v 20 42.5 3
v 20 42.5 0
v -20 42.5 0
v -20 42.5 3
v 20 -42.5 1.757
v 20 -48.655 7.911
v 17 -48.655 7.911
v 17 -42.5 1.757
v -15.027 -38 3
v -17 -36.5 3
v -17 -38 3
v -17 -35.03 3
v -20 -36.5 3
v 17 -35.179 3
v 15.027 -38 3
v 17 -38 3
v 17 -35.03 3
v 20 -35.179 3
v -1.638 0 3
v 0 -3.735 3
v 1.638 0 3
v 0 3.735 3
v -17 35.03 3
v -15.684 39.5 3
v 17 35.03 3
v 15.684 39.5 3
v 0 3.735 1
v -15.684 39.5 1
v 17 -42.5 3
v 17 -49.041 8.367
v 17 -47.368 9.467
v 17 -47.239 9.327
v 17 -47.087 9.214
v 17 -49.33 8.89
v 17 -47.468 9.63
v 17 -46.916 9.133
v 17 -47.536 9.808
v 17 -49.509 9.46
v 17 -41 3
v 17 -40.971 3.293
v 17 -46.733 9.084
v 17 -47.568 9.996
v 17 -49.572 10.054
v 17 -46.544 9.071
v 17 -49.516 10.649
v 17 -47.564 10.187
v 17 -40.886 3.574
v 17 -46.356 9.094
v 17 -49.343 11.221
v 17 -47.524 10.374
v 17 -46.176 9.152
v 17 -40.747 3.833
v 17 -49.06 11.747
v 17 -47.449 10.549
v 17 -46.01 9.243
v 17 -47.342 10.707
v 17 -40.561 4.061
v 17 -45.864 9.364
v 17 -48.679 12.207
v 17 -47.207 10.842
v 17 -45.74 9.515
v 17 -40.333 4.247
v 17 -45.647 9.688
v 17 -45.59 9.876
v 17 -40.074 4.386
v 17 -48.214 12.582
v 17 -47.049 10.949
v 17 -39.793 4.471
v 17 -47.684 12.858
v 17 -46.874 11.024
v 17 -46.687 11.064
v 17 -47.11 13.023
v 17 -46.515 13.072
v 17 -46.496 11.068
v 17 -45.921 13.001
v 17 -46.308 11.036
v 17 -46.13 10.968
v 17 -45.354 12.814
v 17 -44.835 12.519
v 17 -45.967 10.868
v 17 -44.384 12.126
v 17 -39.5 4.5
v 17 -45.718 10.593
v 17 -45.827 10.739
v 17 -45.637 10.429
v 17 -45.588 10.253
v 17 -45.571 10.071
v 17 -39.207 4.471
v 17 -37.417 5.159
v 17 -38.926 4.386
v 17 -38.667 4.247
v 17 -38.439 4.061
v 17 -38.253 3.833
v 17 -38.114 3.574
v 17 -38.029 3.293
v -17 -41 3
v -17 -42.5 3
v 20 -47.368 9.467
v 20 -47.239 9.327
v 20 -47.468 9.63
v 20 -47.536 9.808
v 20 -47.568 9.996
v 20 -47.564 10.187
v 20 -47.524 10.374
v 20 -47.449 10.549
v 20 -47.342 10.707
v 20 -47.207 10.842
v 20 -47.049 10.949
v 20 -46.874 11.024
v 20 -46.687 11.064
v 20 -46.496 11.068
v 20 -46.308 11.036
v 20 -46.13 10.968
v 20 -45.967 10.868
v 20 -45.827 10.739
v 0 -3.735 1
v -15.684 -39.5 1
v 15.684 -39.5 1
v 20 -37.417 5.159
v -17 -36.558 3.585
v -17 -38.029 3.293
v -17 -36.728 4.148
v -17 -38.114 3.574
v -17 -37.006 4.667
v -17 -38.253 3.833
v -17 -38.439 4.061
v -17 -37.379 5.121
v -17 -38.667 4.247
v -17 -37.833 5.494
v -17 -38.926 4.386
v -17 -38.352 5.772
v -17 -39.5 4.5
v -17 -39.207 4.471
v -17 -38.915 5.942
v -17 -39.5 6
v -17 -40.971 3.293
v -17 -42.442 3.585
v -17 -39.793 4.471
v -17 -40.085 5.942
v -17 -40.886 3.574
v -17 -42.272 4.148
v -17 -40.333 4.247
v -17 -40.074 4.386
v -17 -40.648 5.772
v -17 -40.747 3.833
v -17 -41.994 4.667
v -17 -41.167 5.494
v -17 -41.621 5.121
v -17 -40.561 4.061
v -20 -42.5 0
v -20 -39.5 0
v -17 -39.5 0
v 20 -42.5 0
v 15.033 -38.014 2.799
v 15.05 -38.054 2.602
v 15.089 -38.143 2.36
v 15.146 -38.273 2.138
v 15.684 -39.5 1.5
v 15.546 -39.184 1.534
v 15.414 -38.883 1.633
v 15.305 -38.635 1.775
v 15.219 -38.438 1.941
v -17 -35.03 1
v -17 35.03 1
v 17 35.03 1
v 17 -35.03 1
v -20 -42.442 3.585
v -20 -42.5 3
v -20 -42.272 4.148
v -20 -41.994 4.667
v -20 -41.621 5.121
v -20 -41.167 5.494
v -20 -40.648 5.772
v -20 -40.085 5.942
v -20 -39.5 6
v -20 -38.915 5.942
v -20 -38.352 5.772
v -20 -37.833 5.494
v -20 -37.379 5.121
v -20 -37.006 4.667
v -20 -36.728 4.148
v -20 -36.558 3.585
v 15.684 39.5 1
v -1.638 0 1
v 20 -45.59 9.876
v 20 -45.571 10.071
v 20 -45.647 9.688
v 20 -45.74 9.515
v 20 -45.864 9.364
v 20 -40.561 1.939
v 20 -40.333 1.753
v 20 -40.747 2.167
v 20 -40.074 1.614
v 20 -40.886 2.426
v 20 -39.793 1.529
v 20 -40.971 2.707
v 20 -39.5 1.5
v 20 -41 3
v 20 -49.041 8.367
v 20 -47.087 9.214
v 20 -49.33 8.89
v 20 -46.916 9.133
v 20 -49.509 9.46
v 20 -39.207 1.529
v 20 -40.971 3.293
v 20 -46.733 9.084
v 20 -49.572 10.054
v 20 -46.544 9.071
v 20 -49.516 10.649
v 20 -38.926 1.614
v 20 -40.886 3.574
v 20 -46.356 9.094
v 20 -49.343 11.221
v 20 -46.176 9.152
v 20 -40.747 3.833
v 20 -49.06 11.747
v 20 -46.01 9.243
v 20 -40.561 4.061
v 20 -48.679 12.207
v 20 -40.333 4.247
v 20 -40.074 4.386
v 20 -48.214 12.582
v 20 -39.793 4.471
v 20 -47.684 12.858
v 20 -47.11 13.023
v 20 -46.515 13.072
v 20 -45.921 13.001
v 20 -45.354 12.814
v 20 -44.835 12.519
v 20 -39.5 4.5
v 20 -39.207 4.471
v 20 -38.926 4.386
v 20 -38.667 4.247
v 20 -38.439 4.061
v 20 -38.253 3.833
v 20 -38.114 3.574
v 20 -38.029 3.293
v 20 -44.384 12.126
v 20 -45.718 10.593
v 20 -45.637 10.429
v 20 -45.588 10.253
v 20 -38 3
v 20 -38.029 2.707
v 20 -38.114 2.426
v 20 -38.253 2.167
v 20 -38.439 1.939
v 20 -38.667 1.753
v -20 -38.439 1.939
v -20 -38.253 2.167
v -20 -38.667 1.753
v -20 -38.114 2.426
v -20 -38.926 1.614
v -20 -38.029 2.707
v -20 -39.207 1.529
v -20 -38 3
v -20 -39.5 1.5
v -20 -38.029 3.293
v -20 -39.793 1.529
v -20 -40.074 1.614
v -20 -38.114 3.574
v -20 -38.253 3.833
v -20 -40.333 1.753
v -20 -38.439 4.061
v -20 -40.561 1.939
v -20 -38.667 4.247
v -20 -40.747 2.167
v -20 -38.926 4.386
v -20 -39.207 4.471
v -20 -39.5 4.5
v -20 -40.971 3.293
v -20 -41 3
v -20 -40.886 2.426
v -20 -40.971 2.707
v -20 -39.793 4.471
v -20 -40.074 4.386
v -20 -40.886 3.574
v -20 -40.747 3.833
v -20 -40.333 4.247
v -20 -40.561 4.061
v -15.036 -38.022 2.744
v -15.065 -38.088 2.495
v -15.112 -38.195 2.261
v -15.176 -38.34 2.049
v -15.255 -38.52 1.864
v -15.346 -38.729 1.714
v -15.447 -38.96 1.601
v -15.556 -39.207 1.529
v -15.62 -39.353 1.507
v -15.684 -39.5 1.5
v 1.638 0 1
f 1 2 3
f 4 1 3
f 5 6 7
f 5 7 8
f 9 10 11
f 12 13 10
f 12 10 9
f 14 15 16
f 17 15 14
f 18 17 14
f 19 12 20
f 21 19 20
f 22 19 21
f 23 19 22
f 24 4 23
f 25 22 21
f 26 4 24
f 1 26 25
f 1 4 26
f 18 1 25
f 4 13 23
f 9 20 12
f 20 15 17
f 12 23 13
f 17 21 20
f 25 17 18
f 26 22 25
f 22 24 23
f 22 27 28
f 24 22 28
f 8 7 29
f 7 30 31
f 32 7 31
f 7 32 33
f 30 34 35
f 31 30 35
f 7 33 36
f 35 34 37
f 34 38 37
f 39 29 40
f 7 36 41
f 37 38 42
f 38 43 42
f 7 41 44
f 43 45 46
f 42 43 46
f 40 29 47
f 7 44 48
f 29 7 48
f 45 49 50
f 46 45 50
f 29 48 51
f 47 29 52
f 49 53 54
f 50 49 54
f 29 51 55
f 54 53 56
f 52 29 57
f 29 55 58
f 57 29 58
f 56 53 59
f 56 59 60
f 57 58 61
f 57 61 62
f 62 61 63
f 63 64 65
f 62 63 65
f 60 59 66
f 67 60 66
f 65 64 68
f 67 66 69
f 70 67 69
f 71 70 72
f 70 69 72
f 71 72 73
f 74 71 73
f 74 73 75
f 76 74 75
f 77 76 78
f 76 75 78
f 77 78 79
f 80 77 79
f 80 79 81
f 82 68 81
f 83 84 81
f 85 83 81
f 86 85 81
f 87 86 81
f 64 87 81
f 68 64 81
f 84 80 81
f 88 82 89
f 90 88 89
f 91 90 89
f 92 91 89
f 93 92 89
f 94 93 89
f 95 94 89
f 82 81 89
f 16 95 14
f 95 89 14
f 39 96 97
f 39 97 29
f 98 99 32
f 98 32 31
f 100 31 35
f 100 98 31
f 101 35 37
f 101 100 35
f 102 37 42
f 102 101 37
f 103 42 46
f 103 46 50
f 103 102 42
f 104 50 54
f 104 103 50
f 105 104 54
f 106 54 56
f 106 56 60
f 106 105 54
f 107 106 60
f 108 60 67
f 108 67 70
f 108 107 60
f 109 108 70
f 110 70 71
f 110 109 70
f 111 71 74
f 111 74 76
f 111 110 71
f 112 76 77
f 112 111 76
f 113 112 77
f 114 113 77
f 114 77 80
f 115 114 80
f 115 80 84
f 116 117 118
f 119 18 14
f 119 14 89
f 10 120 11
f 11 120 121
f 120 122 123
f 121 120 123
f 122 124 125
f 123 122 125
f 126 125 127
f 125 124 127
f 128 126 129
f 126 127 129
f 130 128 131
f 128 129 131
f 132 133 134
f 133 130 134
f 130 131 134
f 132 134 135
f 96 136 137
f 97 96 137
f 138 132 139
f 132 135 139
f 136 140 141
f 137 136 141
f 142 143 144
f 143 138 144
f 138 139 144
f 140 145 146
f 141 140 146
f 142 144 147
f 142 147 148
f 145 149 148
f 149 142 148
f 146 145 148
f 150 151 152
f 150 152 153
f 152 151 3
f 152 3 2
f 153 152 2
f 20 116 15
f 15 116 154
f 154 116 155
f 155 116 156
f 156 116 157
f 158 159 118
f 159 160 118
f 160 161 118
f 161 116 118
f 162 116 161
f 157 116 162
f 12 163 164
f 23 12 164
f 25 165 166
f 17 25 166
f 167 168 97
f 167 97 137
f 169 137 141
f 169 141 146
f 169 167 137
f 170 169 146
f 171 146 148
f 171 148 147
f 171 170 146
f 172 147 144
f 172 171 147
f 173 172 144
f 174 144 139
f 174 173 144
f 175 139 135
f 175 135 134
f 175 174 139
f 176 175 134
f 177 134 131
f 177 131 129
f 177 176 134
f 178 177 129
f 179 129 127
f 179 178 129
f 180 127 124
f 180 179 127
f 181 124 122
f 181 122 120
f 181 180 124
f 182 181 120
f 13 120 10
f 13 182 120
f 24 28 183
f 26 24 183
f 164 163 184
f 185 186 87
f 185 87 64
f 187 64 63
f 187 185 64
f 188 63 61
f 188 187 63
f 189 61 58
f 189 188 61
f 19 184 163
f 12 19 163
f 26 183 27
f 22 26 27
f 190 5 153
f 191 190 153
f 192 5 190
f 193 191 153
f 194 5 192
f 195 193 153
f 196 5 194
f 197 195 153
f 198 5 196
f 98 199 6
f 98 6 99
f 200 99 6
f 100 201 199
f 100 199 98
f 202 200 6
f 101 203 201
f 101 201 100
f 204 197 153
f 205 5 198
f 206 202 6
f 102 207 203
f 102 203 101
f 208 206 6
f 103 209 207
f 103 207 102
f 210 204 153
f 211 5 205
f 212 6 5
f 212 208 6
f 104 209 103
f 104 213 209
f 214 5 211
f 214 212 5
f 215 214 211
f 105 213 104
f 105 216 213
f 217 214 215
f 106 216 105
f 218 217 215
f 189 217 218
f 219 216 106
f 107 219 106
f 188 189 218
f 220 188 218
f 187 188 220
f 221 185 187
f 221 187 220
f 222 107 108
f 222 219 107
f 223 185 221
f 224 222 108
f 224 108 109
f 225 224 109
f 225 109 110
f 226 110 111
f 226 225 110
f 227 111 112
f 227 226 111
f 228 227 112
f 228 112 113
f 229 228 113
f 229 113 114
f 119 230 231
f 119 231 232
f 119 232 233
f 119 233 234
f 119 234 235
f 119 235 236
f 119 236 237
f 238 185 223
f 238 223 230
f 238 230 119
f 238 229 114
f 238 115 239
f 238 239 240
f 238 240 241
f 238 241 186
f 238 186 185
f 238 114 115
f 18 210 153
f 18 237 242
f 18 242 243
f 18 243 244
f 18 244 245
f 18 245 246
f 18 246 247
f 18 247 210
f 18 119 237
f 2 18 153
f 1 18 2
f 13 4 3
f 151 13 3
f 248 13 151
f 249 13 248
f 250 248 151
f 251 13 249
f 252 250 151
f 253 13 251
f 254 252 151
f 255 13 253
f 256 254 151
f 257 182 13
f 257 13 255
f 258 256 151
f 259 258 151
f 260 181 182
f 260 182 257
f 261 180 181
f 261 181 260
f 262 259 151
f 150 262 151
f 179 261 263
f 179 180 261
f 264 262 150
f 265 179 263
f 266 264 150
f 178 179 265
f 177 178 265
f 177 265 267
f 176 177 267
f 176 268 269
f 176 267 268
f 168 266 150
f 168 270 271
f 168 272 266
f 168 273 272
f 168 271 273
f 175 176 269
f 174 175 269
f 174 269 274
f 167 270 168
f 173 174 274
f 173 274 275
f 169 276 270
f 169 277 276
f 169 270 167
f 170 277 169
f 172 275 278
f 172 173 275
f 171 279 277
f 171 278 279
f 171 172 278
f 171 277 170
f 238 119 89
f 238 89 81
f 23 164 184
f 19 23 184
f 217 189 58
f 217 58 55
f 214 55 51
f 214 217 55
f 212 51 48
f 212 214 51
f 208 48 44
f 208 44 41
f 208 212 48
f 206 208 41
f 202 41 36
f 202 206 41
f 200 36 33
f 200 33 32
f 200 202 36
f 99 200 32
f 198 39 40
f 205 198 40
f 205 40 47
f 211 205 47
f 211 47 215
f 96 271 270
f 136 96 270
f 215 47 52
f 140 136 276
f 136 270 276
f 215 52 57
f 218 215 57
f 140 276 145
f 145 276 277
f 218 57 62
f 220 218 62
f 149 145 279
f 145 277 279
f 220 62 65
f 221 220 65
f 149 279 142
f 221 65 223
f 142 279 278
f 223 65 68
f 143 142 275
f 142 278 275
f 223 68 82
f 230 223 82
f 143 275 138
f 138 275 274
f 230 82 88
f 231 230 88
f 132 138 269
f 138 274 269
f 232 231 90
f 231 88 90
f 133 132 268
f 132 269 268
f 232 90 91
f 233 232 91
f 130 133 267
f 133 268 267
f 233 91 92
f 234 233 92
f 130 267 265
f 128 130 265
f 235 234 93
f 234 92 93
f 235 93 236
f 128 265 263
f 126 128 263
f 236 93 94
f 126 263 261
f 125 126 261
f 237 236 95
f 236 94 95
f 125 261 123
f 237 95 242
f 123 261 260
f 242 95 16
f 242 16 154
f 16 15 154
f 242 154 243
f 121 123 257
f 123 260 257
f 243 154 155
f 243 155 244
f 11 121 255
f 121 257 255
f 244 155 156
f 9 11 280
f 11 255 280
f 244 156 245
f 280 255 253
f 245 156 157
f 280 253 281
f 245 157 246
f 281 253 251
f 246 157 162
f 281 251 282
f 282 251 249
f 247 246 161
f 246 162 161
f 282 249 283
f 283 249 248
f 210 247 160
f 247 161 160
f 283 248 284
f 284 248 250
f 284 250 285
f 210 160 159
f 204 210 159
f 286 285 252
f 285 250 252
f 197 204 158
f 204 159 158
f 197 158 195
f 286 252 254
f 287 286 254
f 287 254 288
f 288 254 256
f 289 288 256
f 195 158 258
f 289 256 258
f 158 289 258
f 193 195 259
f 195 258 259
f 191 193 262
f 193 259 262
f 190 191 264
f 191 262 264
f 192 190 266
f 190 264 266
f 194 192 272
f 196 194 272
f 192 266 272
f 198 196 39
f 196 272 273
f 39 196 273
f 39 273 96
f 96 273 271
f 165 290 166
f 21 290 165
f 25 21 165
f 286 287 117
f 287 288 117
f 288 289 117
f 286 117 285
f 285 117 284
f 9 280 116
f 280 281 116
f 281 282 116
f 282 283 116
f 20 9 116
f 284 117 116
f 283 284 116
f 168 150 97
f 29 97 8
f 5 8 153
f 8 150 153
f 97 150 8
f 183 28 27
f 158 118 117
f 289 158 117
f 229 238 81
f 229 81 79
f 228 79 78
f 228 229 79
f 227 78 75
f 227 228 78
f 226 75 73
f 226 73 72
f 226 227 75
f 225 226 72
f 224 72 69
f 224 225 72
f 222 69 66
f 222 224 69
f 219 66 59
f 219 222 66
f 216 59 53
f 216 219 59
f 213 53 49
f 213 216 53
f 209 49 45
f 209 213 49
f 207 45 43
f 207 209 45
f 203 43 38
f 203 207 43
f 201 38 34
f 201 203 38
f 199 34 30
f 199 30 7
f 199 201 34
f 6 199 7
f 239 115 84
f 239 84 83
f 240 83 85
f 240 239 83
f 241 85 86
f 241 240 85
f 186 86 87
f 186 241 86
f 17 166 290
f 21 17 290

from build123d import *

# Parameters (mm, degrees)
F0_W      = 40
F0_H      = 85
F1_DEPTH  = 1
F2_W      = 3
F2_H      = 3
F3_DEPTH  = 2
F5_DEPTH  = 3
F7_DEPTH  = 3
F9_R      = 1.5
F10_DEPTH = 45


with BuildPart() as f1:
    # F0 (on Top) → F1 (new body)
    with BuildSketch(Plane.XY):
        Rectangle(F0_W, F0_H)
    extrude(amount=F1_DEPTH)

    # F2 (on face) → F3 (join)
    with BuildSketch(Plane.XY.offset(1)):
        Polygon((-17, -42.5), (17, -42.5), (15.6843836329, -39.5), (-15.6843836329, -39.5), align=None)
        Polygon((-17, -39.5), (-17, -42.5), (-15.6843836329, -39.5), align=None)
        with Locations((-18.5, -41)):
            Rectangle(F2_W, F2_H)
        Polygon((15.6843836329, -39.5), (17, -42.5), (17, -39.5), align=None)
        with Locations((18.5, -41)):
            Rectangle(F2_W, F2_H)
        Polygon((17, -35.0301999523), (17, -39.5), (20, -39.5), (20, 39.5), (17, 39.5), (17, 35.0301999523), align=None)
        Polygon((15.6843836329, -39.5), (17, -39.5), (17, -35.0301999523), (1.6378985336, 0), (0, -3.7349000238), align=None)
        Polygon((-15.6843836329, -39.5), (0, -3.7349000238), (-1.6378985336, 0), (-17, -35.0301999523), (-17, -39.5), align=None)
        Polygon((-20, -39.5), (-17, -39.5), (-17, -35.0301999523), (-17, 35.0301999523), (-17, 39.5), (-20, 39.5), align=None)
        Polygon((-1.6378985336, 0), (0, -3.7349000238), (1.6378985336, 0), (0, 3.7349000238), align=None)
        Polygon((-17, 35.0301999523), (-1.6378985336, 0), (0, 3.7349000238), (-15.6843836329, 39.5), (-17, 39.5), align=None)
        Polygon((1.6378985336, 0), (17, 35.0301999523), (17, 39.5), (15.6843836329, 39.5), (0, 3.7349000238), align=None)
        with Locations((-18.5, 41)):
            Rectangle(F2_W, F2_H)
        Polygon((-17, 39.5), (-15.6843836329, 39.5), (-17, 42.5), align=None)
        Polygon((15.6843836329, 39.5), (17, 42.5), (-17, 42.5), (-15.6843836329, 39.5), align=None)
        Polygon((15.6843836329, 39.5), (17, 39.5), (17, 42.5), align=None)
        with Locations((18.5, 41)):
            Rectangle(F2_W, F2_H)
    extrude(amount=F3_DEPTH)

    # F4 (on face) → F5 (join)
    with BuildSketch(Plane.YZ.offset(20)):
        with BuildLine():
            ThreePointArc((-42.5, 3), (-42.2716385975, 4.1480502971), (-41.6213203436, 5.1213203436))
            Line((-41.6213203436, 5.1213203436), (-44.4490675498, 7.9490675498))
            ThreePointArc((-44.4490675498, 7.9490675498), (-46.5442111918, 7.0702264387), (-48.6547486938, 7.9114279791))
            Line((-48.6547486938, 7.9114279791), (-42.5, 1.7572743533))
            Line((-42.5, 1.7572743533), (-42.5, 3))
        make_face()
        with BuildLine():
            Line((-39.5, 3), (-36.5, 3))
            ThreePointArc((-36.5, 3), (-36.7387500509, 4.1728165749), (-37.4169991456, 5.1589598052))
            ThreePointArc((-37.4169991456, 5.1589598052), (-39.5268566208, 5.9998797846), (-41.6213203436, 5.1213203436))
            Line((-41.6213203436, 5.1213203436), (-39.5, 3))
        make_face()
        with BuildLine():
            Line((-42.5, 3), (-39.5, 3))
            Line((-39.5, 3), (-41.6213203436, 5.1213203436))
            ThreePointArc((-41.6213203436, 5.1213203436), (-42.2716385975, 4.1480502971), (-42.5, 3))
        make_face()
        with BuildLine():
            ThreePointArc((-37.4169991456, 5.1589598052), (-36.7387500509, 4.1728165749), (-36.5, 3))
            Line((-36.5, 3), (-35.1793104616, 3))
            Line((-35.1793104616, 3), (-37.4169991456, 5.1589598052))
        make_face()
        with BuildLine():
            ThreePointArc((-41.6213203436, 5.1213203436), (-39.5268566208, 5.9998797846), (-37.4169991456, 5.1589598052))
            Line((-37.4169991456, 5.1589598052), (-44.3843033436, 12.1262640032))
            ThreePointArc((-44.3843033436, 12.1262640032), (-43.7810708304, 11.1763673496), (-43.5701062619, 10.0710678119))
            ThreePointArc((-43.5701062619, 10.0710678119), (-43.798540858, 8.9226495455), (-44.4490675498, 7.9490675498))
            Line((-44.4490675498, 7.9490675498), (-41.6213203436, 5.1213203436))
        make_face()
        with BuildLine():
            ThreePointArc((-43.5701062619, 10.0710678119), (-43.7810708304, 11.1763673496), (-44.3843033436, 12.1262640032))
            Line((-44.3843033436, 12.1262640032), (-44.4121080066, 12.1540686663))
            Line((-44.4121080066, 12.1540686663), (-45.8270022514, 10.7391744215))
            ThreePointArc((-45.8270022514, 10.7391744215), (-45.6372408578, 10.4287928736), (-45.5710678119, 10.0710678119))
            ThreePointArc((-45.5710678119, 10.0710678119), (-45.6471882794, 9.6883843795), (-45.8639610307, 9.3639610307))
            Line((-45.8639610307, 9.3639610307), (-44.4490675498, 7.9490675498))
            ThreePointArc((-44.4490675498, 7.9490675498), (-43.798540858, 8.9226495455), (-43.5701062619, 10.0710678119))
        make_face()
        with BuildLine():
            ThreePointArc((-48.6547486938, 7.9114279791), (-46.5442111918, 7.0702264387), (-44.4490675498, 7.9490675498))
            Line((-44.4490675498, 7.9490675498), (-45.8639610307, 9.3639610307))
            ThreePointArc((-45.8639610307, 9.3639610307), (-46.5442025706, 9.0714287476), (-47.2391744215, 9.3270022514))
            Line((-47.2391744215, 9.3270022514), (-48.6547486938, 7.9114279791))
        make_face()
        with BuildLine():
            Line((-44.4121080066, 12.1540686663), (-44.3843033436, 12.1262640032))
            ThreePointArc((-44.3843033436, 12.1262640032), (-48.6791160167, 12.2069289943), (-48.6547486938, 7.9114279791))
            Line((-48.6547486938, 7.9114279791), (-47.2391744215, 9.3270022514))
            ThreePointArc((-47.2391744215, 9.3270022514), (-47.2781745931, 10.7781745931), (-45.8270022514, 10.7391744215))
            Line((-45.8270022514, 10.7391744215), (-44.4121080066, 12.1540686663))
        make_face()
    extrude(amount=-F5_DEPTH)

    # F6 (on face) → F7 (join)
    with BuildSketch(Plane(origin=(-20, 0, 0), x_dir=(0, -1, 0), z_dir=(-1, 0, 0))):
        with BuildLine():
            Line((36.5, 3), (42.5, 3))
            ThreePointArc((42.5, 3), (39.5, 6), (36.5, 3))
        make_face()
        with BuildLine():
            ThreePointArc((39.5000000598, 0), (41.6213203647, 0.8786796776), (42.5, 3))
            Line((42.5, 3), (36.5, 3))
            ThreePointArc((36.5, 3), (37.3786796776, 0.8786796353), (39.5000000598, 0))
        make_face()
    extrude(amount=-F7_DEPTH)

    # F8: union 

    # F9 (on face) → F10 (cut)
    with BuildSketch(Plane(origin=(-20, 0, 0), x_dir=(0, -1, 0), z_dir=(-1, 0, 0))):
        with Locations((39.5, 3)):
            Circle(F9_R)
    extrude(amount=-F10_DEPTH, mode=Mode.SUBTRACT)


solid = f1.part
